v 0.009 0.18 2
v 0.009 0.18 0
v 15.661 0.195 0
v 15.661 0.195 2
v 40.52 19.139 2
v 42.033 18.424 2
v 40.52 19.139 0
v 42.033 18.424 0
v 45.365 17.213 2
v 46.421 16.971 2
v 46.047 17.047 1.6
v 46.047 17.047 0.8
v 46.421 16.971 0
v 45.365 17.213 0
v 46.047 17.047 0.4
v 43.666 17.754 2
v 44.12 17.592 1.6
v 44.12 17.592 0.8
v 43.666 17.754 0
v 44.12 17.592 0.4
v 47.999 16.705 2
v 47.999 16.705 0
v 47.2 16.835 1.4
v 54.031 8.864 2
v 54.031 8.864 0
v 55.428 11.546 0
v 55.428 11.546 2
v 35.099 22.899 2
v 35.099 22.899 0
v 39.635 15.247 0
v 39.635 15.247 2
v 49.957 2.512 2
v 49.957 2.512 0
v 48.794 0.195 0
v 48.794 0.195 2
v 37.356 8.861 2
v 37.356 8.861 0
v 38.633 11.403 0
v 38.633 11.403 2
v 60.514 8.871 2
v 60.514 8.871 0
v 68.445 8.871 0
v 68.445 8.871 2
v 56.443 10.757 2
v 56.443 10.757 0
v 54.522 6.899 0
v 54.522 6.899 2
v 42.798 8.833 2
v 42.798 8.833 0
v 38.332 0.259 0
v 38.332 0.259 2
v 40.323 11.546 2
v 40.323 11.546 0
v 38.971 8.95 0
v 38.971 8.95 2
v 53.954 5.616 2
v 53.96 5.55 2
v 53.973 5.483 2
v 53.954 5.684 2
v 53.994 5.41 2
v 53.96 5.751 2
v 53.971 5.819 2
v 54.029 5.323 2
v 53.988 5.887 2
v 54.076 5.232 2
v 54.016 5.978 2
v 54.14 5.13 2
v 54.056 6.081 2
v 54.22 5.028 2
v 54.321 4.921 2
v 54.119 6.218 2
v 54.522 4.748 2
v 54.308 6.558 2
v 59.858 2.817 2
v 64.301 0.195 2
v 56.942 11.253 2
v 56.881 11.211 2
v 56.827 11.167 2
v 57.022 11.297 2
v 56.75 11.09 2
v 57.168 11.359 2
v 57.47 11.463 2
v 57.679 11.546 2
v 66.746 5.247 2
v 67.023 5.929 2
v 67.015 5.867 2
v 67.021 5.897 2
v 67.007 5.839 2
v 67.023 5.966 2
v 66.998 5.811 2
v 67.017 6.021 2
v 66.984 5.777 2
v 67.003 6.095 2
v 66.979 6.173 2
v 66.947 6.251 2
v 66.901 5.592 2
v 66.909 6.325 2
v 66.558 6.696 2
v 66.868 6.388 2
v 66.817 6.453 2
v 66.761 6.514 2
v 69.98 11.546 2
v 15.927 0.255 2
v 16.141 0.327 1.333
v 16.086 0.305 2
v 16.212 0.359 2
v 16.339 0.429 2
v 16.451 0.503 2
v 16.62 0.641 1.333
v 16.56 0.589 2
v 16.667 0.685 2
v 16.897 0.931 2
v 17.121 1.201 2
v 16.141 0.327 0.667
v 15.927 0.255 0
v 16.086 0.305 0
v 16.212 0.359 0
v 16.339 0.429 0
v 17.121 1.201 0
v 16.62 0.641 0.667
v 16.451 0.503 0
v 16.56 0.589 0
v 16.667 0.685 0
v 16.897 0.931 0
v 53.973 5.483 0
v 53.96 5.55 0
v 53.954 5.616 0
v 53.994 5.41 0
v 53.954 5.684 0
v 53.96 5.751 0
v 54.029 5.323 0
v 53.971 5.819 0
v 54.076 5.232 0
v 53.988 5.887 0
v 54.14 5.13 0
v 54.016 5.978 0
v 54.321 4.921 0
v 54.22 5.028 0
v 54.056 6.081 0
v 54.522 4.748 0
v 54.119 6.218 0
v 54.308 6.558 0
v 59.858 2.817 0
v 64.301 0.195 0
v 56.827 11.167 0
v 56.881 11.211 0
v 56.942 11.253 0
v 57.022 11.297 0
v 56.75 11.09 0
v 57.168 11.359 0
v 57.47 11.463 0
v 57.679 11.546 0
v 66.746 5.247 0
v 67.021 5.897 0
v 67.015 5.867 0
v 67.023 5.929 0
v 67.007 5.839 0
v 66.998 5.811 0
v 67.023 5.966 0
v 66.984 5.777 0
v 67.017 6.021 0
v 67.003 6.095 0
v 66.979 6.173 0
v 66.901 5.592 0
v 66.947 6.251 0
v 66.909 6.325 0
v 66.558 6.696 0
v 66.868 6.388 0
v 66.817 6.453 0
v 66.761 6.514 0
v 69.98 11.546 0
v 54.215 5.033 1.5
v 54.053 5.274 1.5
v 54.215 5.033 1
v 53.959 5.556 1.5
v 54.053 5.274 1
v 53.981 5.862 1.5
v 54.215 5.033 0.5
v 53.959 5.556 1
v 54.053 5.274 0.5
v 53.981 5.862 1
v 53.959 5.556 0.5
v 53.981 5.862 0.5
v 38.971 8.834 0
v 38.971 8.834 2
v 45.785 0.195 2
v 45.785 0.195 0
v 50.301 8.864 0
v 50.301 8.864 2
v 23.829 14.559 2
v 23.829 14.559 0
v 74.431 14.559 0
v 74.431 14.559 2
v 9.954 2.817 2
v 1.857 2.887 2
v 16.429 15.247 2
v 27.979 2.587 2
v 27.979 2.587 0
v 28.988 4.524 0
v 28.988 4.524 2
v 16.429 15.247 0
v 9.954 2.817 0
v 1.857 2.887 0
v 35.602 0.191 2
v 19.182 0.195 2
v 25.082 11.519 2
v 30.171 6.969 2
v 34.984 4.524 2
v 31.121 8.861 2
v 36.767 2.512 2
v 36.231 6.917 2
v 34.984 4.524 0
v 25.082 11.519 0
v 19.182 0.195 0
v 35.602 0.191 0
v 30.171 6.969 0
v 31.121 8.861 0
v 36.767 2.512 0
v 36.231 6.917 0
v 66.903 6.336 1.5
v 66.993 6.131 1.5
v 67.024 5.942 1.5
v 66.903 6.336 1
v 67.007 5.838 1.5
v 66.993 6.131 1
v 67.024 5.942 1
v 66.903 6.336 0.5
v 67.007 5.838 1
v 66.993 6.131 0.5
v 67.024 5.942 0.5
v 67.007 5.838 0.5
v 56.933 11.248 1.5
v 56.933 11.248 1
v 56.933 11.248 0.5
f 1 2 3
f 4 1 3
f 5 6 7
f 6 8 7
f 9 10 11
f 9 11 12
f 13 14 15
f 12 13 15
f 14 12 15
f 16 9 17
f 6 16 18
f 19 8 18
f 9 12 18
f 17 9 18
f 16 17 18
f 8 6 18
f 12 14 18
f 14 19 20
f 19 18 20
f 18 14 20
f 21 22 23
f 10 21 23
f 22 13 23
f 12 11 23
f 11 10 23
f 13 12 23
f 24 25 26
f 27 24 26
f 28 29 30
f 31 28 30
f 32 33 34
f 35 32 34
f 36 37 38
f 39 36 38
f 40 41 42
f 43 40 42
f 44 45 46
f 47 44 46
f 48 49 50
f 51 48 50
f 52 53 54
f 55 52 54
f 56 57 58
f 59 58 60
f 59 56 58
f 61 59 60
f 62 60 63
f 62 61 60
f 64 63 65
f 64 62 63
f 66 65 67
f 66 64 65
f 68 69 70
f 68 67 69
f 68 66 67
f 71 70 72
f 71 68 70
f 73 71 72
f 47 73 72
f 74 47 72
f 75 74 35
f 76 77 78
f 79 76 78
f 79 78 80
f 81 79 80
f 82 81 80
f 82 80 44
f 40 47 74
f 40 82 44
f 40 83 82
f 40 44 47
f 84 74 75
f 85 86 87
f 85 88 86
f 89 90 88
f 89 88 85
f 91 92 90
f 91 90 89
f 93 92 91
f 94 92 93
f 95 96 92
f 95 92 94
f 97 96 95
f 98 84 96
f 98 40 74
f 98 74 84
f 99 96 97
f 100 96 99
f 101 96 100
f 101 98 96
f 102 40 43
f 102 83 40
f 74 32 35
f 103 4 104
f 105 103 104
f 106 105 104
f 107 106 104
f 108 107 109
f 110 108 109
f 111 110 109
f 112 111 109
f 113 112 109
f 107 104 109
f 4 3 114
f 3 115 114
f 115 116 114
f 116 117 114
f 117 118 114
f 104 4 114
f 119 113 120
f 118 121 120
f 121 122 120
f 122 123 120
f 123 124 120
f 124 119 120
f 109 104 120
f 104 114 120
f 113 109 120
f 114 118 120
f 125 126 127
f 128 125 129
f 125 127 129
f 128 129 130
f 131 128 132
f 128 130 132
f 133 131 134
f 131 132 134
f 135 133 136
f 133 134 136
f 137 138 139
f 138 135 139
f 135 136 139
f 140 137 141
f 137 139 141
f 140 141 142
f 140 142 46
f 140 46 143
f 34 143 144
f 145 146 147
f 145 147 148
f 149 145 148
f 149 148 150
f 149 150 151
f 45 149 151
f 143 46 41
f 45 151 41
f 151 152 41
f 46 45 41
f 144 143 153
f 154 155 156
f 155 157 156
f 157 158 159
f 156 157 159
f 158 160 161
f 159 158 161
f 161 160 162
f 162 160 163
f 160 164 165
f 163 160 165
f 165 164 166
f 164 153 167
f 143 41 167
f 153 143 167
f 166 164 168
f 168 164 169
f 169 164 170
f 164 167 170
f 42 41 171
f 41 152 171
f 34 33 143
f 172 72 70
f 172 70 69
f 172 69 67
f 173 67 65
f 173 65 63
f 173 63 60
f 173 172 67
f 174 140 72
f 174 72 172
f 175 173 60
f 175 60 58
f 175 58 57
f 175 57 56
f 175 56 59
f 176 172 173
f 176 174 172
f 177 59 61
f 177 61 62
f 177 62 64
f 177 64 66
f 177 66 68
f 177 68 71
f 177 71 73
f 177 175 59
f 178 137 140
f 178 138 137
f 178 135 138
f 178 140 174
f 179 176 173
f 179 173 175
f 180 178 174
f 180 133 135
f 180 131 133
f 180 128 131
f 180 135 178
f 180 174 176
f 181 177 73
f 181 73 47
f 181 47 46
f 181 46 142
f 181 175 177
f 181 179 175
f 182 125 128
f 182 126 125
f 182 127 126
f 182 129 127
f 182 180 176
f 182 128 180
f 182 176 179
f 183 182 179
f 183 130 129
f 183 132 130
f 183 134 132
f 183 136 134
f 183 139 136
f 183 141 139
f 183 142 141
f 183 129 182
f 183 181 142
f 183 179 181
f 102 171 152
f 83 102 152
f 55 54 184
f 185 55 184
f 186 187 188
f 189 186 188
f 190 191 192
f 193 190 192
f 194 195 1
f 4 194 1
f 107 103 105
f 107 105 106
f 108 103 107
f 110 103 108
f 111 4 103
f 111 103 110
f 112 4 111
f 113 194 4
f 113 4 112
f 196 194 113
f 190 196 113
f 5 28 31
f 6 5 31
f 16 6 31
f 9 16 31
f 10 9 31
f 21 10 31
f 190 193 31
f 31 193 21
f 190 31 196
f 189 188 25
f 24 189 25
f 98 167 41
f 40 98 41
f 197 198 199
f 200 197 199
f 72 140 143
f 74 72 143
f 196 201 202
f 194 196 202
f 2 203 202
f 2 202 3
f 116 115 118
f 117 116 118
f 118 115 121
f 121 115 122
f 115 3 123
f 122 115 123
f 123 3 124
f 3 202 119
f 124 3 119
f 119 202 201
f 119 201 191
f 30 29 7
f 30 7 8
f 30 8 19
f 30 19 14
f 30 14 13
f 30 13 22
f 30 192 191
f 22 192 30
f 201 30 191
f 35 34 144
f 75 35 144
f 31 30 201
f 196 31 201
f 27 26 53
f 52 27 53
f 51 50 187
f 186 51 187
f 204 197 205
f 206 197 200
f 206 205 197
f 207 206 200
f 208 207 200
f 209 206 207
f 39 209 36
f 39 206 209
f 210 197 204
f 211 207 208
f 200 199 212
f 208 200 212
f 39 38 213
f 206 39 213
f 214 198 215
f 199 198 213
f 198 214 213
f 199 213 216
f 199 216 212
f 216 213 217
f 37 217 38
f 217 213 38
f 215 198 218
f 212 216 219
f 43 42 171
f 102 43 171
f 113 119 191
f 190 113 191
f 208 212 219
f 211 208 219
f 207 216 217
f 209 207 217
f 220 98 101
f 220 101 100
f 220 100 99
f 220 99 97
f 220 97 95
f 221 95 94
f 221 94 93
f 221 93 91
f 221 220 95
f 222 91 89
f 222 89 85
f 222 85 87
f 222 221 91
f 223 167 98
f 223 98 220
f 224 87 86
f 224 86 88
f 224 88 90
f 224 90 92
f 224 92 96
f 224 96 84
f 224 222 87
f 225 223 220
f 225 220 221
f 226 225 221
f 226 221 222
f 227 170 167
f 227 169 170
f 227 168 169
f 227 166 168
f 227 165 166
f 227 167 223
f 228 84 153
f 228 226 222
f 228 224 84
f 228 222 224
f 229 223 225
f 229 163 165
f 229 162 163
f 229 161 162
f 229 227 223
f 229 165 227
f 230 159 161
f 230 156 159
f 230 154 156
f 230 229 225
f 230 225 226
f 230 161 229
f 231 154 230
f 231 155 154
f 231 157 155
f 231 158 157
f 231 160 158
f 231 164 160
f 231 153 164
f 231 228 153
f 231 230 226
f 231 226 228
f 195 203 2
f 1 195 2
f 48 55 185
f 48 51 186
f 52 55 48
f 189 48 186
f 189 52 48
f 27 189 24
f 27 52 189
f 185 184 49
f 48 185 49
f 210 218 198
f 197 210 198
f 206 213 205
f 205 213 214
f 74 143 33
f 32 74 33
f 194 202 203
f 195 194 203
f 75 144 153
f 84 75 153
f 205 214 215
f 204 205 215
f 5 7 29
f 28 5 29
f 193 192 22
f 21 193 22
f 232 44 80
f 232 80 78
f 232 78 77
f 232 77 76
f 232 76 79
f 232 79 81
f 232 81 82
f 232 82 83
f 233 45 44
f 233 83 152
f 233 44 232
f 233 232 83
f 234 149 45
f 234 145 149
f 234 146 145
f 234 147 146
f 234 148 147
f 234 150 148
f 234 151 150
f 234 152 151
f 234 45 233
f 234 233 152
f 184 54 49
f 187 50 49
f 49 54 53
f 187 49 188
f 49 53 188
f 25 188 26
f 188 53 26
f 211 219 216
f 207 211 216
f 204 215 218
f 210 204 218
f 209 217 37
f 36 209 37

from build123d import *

# Parameters (mm, degrees)
F1_DEPTH = 2


with BuildPart() as f1:
    # F0 (on Top) → F1 (new body)
    with BuildSketch(Plane.XY):
        with BuildLine():
            Line((9.9536469206, 2.8174053878), (1.8566801446, 2.8869523667))
            Line((1.8566801446, 2.8869523667), (0.0092345044, 0.1798552403))
            Line((0.0092345044, 0.1798552403), (15.6612657011, 0.1946620469))
            add(Edge.make_bspline(
                [(15.6612657011, 0.1946620469), (15.8230457266, 0.2281823056), (16.1585921255, 0.2977063528), (16.6514778748, 0.6242701097), (16.9577417021, 1.0001687548), (17.1211827546, 1.2007711921)],
                knots=[0, 0, 0, 0, 0.3027331314, 0.6278958833, 1, 1, 1, 1], degree=3))
            Line((17.1211827546, 1.2007711921), (23.8293986768, 14.5588666201))
            Line((23.8293986768, 14.5588666201), (74.4310542941, 14.5588666201))
            Line((74.4310542941, 14.5588666201), (47.9988604784, 16.7051292956))
            add(Edge.make_bspline(
                [(47.9988604784, 16.7051292956), (47.8096775677, 16.7363682019), (47.3431497551, 16.8134037997), (45.9777756708, 17.0267450866), (44.0975826202, 17.5610655971), (42.1922812666, 18.329325656), (41.0668243334, 18.8742033544), (40.5201017857, 19.1388931125)],
                knots=[0, 0, 0, 0, 0.128570723, 0.3170572751, 0.5463912938, 0.7796467371, 1, 1, 1, 1], degree=3))
            Line((40.5201017857, 19.1388931125), (35.0988097489, 22.8986144066))
            Line((35.0988097489, 22.8986144066), (39.6348685026, 15.2468103915))
            Line((39.6348685026, 15.2468103915), (16.4289344102, 15.2468103915))
            Line((16.4289344102, 15.2468103915), (9.9536469206, 2.8174053878))
        make_face()
    extrude(amount=F1_DEPTH)


with BuildPart() as f1b:
    # F0 (on Top) → F1, piece 2 (new body)
    with BuildSketch(Plane.XY):
        Polygon((25.0818674452, 11.5194685599), (19.1823914647, 0.1953418105), (35.6020256233, 0.1910578924), (36.7674244144, 2.5117208591), (27.978917565, 2.5872076577), (28.9881657809, 4.5244737397), (34.9843449121, 4.5244737397), (36.2305141462, 6.9165130336), (30.170893345, 6.9685607117), (31.1214029789, 8.8613140968), (37.3561011948, 8.8613140968), (38.6325334037, 11.4030783232), align=None)
    extrude(amount=F1_DEPTH)


with BuildPart() as f1c:
    # F0 (on Top) → F1, piece 3 (new body)
    with BuildSketch(Plane.XY):
        Polygon((40.323175932, 11.5464127269), (38.9707796276, 8.9504690841), (38.9707796276, 8.834216421), (42.7982492324, 8.8332178259), (38.3315689349, 0.259362452), (45.7851350839, 0.1953418105), (50.3013804555, 8.8643380381), (54.0311330535, 8.8643380381), (55.4284006357, 11.5464127269), align=None)
    extrude(amount=F1_DEPTH)


with BuildPart() as f1d:
    # F0 (on Top) → F1, piece 4 (new body)
    with BuildSketch(Plane.XY):
        with BuildLine():
            Line((49.9568315862, 2.5117208591), (48.7935841084, 0.1953418105))
            Line((48.7935841084, 0.1953418105), (64.3005892634, 0.1953418105))
            Line((64.3005892634, 0.1953418105), (66.7456910014, 5.2469656803))
            add(Edge.make_bspline(
                [(66.5581822395, 6.6960989498), (66.6872070802, 6.5872148135), (66.9336331603, 6.3792557046), (67.0553482952, 5.9359708808), (66.962957301, 5.7302306954), (66.828224861, 5.4305455866), (66.7456910014, 5.2469656803)],
                knots=[0, 0, 0, 0, 0.2775927016, 0.5301776076, 0.7121980765, 1, 1, 1, 1], degree=3))
            Line((66.5581822395, 6.6960989498), (60.5144836009, 8.8705513626))
            Line((60.5144836009, 8.8705513626), (68.44484061, 8.8705513626))
            Line((68.44484061, 8.8705513626), (69.97974962, 11.5464127269))
            Line((69.97974962, 11.5464127269), (57.67916888, 11.5464127269))
            add(Edge.make_bspline(
                [(56.4427152276, 10.7572088018), (56.5097757599, 10.8247017337), (56.6550063566, 10.9708687624), (56.9013644515, 11.2901557643), (57.4332747424, 11.4411156616), (57.6075265449, 11.5157339653), (57.67916888, 11.5464127269)],
                knots=[0, 0, 0, 0, 0.2238252163, 0.4847302664, 0.788150674, 1, 1, 1, 1], degree=3))
            Line((56.4427152276, 10.7572088018), (54.5217879117, 6.8986215629))
            add(Edge.make_bspline(
                [(54.5217879117, 4.7480957583), (54.4182614649, 4.8313741255), (54.1927501106, 5.0127791477), (53.86783776, 5.559047292), (54.0763350433, 6.2037458312), (54.3665019825, 6.6563862304), (54.5217879117, 6.8986215629)],
                knots=[0, 0, 0, 0, 0.2072963417, 0.4515530113, 0.7064927503, 1, 1, 1, 1], degree=3))
            Line((54.5217879117, 4.7480957583), (59.8580613732, 2.8174053878))
            Line((59.8580613732, 2.8174053878), (49.9568315862, 2.5117208591))
        make_face()
    extrude(amount=F1_DEPTH)


solid = Compound([f1.part, f1b.part, f1c.part, f1d.part])
